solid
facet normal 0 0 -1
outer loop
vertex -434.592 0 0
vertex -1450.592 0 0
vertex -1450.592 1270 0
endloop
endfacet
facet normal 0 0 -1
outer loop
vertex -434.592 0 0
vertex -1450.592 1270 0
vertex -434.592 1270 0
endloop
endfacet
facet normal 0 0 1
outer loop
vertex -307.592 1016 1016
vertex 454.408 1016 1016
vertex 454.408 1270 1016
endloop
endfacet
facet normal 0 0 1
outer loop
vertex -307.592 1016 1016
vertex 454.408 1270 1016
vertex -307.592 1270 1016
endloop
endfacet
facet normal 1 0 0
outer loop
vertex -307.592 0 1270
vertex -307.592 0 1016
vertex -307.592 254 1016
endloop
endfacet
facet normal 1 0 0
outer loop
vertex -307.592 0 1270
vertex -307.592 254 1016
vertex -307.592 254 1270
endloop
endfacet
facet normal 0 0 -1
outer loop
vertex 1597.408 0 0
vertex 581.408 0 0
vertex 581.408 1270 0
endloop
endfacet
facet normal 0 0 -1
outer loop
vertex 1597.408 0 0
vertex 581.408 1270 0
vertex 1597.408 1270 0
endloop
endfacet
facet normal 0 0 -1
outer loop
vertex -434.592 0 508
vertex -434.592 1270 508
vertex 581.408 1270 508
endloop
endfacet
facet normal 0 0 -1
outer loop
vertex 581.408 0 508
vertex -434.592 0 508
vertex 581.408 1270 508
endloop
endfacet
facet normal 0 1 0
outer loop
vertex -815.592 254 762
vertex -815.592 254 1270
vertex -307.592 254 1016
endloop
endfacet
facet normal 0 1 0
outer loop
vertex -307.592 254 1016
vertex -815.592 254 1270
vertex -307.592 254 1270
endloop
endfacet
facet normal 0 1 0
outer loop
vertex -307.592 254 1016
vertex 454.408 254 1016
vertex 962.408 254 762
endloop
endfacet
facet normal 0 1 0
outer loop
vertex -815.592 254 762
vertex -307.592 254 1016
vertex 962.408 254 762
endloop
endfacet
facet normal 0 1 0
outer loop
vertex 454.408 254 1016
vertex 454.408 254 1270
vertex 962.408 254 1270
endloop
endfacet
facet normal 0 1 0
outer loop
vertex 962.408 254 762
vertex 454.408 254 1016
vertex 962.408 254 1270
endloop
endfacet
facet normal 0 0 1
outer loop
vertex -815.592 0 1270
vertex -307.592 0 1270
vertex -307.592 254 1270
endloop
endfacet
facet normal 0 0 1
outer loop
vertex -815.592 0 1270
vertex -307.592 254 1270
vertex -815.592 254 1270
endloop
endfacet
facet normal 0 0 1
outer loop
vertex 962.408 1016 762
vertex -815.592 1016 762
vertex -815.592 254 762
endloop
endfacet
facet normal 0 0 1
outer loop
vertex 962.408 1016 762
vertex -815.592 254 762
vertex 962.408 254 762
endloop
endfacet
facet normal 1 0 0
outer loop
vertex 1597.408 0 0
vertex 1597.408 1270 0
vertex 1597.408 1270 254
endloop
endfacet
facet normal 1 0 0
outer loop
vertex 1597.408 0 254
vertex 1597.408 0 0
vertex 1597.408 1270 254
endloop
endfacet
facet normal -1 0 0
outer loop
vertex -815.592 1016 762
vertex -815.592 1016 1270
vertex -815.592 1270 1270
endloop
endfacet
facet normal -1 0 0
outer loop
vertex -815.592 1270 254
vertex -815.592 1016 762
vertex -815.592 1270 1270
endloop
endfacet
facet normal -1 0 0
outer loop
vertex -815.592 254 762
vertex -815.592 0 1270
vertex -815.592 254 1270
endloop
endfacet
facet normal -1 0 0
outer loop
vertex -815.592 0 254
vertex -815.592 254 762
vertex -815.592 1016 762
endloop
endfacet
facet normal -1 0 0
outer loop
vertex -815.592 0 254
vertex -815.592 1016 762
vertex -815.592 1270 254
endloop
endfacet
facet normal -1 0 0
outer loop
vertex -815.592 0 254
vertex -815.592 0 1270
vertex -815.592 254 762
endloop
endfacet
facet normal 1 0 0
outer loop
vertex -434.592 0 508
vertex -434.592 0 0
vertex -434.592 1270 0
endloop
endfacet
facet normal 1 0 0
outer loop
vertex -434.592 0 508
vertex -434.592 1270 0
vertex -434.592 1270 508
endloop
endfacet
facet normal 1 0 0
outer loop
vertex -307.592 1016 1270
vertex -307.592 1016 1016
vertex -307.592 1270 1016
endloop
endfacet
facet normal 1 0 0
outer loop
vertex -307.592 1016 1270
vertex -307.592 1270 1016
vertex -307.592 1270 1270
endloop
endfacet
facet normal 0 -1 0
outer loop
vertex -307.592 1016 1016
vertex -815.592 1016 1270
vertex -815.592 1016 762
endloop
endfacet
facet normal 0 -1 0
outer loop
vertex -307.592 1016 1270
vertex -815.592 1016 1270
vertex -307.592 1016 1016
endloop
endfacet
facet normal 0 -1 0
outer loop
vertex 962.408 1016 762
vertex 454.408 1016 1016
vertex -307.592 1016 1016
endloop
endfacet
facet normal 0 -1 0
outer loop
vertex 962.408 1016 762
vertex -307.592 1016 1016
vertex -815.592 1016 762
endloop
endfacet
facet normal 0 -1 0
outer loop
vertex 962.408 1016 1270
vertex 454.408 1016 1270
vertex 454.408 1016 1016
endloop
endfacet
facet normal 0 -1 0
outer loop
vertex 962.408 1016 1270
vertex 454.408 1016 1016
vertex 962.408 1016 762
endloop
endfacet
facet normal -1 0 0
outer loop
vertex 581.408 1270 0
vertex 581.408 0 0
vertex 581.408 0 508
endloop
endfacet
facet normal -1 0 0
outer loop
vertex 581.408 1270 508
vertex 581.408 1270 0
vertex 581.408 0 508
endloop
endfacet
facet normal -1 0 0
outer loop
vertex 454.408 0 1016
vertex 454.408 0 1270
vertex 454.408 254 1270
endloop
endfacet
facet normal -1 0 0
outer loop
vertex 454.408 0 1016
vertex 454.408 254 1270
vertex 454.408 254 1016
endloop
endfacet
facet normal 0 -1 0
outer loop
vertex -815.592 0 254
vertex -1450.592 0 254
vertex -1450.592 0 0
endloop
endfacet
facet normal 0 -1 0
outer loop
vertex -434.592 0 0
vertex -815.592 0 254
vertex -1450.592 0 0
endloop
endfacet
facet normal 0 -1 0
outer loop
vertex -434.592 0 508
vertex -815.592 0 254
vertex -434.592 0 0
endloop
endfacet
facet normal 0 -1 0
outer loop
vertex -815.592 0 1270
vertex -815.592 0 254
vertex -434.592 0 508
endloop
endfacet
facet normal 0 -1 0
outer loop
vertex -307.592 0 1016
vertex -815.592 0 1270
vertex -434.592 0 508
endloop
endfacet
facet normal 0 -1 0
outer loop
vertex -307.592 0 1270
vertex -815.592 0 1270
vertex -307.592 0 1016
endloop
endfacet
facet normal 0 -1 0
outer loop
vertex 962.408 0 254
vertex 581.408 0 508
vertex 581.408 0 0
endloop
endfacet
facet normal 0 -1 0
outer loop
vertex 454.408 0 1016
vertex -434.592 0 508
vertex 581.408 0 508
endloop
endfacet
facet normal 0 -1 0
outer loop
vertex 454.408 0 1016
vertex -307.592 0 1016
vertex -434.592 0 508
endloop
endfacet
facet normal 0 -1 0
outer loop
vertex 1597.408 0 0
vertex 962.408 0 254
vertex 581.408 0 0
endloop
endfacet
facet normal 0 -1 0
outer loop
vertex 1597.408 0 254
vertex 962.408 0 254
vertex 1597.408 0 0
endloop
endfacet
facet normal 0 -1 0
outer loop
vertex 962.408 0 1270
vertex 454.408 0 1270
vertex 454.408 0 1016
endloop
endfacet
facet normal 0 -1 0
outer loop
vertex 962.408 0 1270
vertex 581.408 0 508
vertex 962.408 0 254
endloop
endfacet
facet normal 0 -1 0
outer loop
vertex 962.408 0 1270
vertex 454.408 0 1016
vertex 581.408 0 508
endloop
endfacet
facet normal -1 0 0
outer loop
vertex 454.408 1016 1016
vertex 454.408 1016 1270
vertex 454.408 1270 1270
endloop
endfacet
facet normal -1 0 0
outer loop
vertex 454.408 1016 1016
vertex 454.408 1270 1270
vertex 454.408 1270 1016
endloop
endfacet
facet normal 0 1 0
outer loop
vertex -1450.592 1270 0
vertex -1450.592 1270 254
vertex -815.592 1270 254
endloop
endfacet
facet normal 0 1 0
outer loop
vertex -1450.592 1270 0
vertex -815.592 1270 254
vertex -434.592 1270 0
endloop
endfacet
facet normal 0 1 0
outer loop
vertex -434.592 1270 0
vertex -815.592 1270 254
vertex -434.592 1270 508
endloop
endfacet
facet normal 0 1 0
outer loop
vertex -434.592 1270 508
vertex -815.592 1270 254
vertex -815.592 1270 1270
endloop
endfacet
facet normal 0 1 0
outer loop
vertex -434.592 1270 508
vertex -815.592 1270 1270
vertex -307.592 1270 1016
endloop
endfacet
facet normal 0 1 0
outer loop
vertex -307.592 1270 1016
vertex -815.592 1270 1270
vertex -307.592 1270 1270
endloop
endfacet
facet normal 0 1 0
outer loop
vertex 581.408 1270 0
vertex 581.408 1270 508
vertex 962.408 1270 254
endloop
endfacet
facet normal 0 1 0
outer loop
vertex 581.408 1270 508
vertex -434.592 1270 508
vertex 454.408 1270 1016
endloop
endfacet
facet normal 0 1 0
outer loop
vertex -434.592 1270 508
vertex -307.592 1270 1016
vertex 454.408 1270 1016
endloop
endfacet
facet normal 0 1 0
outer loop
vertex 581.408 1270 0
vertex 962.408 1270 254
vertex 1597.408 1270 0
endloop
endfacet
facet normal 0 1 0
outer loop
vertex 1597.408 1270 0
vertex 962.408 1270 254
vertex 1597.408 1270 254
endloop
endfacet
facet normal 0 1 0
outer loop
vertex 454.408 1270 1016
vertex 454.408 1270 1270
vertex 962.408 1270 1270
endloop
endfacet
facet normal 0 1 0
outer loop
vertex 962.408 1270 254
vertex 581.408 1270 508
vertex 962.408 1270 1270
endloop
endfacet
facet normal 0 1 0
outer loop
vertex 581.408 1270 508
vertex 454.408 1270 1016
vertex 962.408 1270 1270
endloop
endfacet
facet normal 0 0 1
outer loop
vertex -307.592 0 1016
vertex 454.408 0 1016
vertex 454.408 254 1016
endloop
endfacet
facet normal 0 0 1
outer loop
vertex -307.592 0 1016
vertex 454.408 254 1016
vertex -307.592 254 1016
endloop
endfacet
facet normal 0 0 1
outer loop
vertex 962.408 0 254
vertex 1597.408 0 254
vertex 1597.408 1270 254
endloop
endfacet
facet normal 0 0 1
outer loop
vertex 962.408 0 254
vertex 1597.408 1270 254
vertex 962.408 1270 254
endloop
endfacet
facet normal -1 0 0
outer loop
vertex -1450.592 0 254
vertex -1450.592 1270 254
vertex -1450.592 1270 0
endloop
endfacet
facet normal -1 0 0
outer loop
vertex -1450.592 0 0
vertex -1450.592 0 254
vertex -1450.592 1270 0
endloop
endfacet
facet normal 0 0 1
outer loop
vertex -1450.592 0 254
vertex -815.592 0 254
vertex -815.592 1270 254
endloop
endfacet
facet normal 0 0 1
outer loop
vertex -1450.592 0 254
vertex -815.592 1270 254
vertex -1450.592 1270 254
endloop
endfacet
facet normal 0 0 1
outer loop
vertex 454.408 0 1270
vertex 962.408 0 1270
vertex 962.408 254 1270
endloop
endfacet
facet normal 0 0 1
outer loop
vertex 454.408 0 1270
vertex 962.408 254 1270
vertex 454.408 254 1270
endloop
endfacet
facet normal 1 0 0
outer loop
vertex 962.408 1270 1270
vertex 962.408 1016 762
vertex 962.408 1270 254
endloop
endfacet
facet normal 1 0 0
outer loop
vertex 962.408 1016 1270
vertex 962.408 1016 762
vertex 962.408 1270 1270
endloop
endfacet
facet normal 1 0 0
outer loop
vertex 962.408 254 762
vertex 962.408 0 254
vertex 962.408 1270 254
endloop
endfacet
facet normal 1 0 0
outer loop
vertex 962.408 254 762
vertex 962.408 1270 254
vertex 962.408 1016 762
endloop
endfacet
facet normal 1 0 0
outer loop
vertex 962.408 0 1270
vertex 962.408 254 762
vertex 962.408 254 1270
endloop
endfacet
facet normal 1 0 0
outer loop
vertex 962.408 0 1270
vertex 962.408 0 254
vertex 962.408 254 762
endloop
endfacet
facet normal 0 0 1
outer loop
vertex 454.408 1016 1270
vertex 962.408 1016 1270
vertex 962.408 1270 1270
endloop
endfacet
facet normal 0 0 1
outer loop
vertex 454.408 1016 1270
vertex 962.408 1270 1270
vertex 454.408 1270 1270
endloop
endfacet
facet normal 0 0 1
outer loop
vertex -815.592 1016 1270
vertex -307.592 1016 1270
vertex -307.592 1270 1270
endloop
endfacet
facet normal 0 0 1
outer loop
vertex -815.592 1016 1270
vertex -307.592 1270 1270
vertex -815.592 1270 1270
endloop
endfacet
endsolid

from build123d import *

# Parameters (mm, degrees)
F1_W     = 1016
F1_H     = 508
F2_DEPTH = 1270
F3_DEPTH = 1270.001
F4_W     = 508
F4_H     = 762
F5_DEPTH = 508
F6_W     = 508
F6_H     = 762
F7_DEPTH = 508
F8_W     = 762
F8_H     = 762
F9_DEPTH = 254


# Not quite as in the source:
# - a variable given as a bare number and used for a length is read in inches; the dataset says mm whatever the document's units were


with BuildPart() as f2:
    # F1 (on Front) → F2 (new body)
    with BuildSketch(Plane.XZ):
        Polygon((-1450.5924028924, 254), (-1450.5924028924, 0), (-434.5924028924, 0), (-434.5924028924, 508), (581.4075971076, 508), (581.4075971076, 0), (1597.4075971076, 0), (1597.4075971076, 254), (962.4075971076, 254), (962.4075971076, 1270), (454.4075971076, 1270), (454.4075971076, 1016), (-307.5924028924, 1016), (-307.5924028924, 1270), (-815.5924028924, 1270), (-815.5924028924, 254), align=None)
        with Locations((73.4075971076, 254)):
            Rectangle(F1_W, F1_H)
    extrude(amount=-F2_DEPTH)

    # F1 (on Front) → F3 (cut, through all)
    with BuildSketch(Plane.XZ):
        with Locations((73.4075971076, 254)):
            Rectangle(F1_W, F1_H)
    extrude(amount=-F3_DEPTH, mode=Mode.SUBTRACT)

    # F4 (on face) → F5 (cut)
    with BuildSketch(Plane.XY.offset(1270)):
        with Locations((-561.5924028924, 635)):
            Rectangle(F4_W, F4_H)
    extrude(amount=-F5_DEPTH, mode=Mode.SUBTRACT)

    # F6 (on face) → F7 (cut)
    with BuildSketch(Plane.XY.offset(1270)):
        with Locations((708.4075971076, 635)):
            Rectangle(F6_W, F6_H)
    extrude(amount=-F7_DEPTH, mode=Mode.SUBTRACT)

    # F8 (on face) → F9 (cut)
    with BuildSketch(Plane.XY.offset(1016)):
        with Locations((73.4075971076, 635)):
            Rectangle(F8_W, F8_H)
    extrude(amount=-F9_DEPTH, mode=Mode.SUBTRACT)


solid = f2.part
